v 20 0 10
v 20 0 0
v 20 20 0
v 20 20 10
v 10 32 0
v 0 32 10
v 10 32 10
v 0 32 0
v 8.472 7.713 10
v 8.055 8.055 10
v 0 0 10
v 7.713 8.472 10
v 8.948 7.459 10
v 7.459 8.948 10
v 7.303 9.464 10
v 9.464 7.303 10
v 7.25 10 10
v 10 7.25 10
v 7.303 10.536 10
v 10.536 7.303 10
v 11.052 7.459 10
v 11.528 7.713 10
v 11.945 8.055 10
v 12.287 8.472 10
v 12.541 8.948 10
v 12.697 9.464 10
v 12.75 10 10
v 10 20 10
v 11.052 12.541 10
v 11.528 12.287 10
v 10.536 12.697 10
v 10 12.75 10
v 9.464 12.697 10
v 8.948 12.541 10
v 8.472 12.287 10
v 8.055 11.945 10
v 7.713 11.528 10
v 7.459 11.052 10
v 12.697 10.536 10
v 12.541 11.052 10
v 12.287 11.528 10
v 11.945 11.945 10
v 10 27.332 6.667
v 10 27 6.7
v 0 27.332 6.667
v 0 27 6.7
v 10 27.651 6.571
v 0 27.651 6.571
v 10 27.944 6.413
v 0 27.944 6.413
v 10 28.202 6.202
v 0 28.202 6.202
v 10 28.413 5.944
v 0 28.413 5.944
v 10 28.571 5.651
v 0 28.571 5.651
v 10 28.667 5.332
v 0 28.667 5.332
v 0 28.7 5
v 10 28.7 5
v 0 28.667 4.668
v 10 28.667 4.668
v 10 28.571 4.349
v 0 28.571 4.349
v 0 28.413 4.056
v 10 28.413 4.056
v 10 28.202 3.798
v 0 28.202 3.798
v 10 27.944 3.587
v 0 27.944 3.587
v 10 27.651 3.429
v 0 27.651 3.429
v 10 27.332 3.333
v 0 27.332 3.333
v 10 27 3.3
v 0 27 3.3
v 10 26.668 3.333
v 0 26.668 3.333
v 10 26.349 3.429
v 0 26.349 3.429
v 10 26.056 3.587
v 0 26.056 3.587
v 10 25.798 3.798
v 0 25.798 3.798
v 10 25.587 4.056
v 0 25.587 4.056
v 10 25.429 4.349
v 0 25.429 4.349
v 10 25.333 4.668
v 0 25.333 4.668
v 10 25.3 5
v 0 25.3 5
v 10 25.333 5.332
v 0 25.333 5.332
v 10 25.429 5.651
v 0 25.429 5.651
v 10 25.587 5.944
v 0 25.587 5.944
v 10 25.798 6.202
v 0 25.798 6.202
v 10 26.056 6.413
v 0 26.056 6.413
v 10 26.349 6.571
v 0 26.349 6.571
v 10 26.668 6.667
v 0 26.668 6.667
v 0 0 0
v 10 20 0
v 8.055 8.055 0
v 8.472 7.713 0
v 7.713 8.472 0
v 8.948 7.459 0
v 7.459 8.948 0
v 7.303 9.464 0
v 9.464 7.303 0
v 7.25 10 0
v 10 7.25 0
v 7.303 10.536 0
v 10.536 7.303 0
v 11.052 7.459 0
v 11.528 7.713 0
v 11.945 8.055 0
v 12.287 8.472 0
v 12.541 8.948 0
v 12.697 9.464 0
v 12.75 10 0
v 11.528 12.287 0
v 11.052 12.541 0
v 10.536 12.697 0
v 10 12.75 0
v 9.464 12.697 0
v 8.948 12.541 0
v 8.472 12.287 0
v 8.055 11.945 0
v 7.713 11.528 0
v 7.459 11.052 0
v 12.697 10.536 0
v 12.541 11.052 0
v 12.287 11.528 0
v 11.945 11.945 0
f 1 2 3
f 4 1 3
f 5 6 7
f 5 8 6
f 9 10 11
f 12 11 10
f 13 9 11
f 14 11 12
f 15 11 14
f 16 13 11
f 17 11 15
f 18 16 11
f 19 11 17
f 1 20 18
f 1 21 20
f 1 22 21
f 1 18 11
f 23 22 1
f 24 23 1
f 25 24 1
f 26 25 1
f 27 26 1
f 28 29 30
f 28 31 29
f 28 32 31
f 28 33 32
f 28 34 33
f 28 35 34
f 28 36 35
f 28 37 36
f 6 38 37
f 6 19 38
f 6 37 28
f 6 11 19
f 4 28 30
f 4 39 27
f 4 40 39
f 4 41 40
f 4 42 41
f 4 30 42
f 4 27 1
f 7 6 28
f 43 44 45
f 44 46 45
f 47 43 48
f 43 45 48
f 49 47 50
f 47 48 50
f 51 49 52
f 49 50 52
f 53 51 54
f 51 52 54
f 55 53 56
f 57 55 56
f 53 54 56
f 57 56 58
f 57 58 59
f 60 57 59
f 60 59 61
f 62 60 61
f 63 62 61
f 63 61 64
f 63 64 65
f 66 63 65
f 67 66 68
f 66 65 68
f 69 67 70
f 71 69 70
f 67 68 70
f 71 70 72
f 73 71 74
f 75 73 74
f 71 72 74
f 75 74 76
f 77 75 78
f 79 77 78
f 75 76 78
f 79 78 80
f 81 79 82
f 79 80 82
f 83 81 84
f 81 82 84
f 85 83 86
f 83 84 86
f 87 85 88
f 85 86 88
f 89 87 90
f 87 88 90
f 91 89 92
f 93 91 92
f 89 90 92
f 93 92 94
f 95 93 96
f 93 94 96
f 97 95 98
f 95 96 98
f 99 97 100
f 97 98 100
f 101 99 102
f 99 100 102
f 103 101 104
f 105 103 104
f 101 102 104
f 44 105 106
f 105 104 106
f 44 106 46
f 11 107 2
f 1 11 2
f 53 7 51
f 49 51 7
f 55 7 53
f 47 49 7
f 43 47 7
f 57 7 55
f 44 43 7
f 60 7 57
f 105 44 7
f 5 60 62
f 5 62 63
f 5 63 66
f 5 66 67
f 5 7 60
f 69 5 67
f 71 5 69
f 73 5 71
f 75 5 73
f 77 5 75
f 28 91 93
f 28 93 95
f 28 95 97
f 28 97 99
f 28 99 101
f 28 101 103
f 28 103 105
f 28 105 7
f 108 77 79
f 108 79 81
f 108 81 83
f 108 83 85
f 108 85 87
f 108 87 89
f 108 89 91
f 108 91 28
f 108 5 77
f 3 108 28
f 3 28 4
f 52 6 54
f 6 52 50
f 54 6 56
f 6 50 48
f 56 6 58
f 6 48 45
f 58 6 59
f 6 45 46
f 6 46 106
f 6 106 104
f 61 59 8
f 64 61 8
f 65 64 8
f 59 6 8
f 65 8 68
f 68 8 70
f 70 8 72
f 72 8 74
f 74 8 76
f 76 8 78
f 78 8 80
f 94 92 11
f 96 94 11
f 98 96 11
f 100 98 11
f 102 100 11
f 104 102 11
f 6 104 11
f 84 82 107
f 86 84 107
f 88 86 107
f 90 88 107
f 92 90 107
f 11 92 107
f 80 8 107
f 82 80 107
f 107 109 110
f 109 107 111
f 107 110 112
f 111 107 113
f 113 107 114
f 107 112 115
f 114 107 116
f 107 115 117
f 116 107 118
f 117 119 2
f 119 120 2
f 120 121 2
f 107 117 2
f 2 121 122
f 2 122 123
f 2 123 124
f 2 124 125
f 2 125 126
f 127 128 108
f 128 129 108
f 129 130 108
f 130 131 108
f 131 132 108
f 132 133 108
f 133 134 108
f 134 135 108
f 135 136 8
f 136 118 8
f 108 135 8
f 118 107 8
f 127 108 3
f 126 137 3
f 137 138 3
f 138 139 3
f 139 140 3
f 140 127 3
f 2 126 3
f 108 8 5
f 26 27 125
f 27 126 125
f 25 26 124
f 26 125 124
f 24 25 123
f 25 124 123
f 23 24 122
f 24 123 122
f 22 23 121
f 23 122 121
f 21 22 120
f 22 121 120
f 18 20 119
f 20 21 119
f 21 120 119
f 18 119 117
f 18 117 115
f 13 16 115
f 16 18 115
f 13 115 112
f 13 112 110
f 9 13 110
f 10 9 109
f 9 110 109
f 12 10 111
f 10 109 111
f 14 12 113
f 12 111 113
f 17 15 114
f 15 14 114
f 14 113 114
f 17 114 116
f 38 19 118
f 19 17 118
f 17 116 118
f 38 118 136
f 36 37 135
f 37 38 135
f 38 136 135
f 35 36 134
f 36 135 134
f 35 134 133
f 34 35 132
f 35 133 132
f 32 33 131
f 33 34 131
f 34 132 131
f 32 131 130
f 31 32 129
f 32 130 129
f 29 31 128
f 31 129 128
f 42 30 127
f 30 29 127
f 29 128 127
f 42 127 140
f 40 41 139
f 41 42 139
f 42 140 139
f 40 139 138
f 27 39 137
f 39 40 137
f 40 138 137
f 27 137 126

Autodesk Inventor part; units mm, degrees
ref_plane "YZ Plane" through (0, 0, 0) normal (1, 0, 0) x (0, 1, 0)
ref_plane "XZ Plane" through (0, 0, 0) normal (0, 1, 0) x (-1, 0, 0)
ref_plane "XY Plane" through (0, 0, 0) normal (0, 0, 1) x (1, 0, 0)
sketch "スケッチ4" plane through (0, 0, 0) normal (0, 0, 1) x (1, 0, 0)
  line L0 (0, 0) -> (20, 0)
  line L1 (20, 0) -> (20, 20)
  line L2 (0, 32) -> (0, 0)
  line L3 (0, 32) -> (10, 32)
  line L4 (10, 32) -> (10, 20)
  line L5 (10, 20) -> (20, 20)
  line L6 (10, 0) -> (10, 7.8024) construction
  circle A0 centre (10, 10) radius 2.75
  dimension "d19" = 20
  dimension "d20" = 32
  dimension "d21" = 12
  dimension "d22" = 10
  dimension "d24" = 5.5
  dimension "d25" = 10
extrude "押し出し4" add sketch "スケッチ4" along normal blind 10
sketch "スケッチ5" plane through (0, 0, 0) normal (-1, 0, 0) x (0, 0, 1)
  line L0 (0, 32) -> (10, 32) projected
  line L1 (5, 32) -> (5, 27) construction
  circle A0 centre (5, 27) radius 1.7
  point P0 (0, 0)
  dimension "d28" = 3.4
  dimension "d29" = 5
extrude "押し出し5" cut sketch "スケッチ5" against normal blind 10
properties part number "pixymount1"
